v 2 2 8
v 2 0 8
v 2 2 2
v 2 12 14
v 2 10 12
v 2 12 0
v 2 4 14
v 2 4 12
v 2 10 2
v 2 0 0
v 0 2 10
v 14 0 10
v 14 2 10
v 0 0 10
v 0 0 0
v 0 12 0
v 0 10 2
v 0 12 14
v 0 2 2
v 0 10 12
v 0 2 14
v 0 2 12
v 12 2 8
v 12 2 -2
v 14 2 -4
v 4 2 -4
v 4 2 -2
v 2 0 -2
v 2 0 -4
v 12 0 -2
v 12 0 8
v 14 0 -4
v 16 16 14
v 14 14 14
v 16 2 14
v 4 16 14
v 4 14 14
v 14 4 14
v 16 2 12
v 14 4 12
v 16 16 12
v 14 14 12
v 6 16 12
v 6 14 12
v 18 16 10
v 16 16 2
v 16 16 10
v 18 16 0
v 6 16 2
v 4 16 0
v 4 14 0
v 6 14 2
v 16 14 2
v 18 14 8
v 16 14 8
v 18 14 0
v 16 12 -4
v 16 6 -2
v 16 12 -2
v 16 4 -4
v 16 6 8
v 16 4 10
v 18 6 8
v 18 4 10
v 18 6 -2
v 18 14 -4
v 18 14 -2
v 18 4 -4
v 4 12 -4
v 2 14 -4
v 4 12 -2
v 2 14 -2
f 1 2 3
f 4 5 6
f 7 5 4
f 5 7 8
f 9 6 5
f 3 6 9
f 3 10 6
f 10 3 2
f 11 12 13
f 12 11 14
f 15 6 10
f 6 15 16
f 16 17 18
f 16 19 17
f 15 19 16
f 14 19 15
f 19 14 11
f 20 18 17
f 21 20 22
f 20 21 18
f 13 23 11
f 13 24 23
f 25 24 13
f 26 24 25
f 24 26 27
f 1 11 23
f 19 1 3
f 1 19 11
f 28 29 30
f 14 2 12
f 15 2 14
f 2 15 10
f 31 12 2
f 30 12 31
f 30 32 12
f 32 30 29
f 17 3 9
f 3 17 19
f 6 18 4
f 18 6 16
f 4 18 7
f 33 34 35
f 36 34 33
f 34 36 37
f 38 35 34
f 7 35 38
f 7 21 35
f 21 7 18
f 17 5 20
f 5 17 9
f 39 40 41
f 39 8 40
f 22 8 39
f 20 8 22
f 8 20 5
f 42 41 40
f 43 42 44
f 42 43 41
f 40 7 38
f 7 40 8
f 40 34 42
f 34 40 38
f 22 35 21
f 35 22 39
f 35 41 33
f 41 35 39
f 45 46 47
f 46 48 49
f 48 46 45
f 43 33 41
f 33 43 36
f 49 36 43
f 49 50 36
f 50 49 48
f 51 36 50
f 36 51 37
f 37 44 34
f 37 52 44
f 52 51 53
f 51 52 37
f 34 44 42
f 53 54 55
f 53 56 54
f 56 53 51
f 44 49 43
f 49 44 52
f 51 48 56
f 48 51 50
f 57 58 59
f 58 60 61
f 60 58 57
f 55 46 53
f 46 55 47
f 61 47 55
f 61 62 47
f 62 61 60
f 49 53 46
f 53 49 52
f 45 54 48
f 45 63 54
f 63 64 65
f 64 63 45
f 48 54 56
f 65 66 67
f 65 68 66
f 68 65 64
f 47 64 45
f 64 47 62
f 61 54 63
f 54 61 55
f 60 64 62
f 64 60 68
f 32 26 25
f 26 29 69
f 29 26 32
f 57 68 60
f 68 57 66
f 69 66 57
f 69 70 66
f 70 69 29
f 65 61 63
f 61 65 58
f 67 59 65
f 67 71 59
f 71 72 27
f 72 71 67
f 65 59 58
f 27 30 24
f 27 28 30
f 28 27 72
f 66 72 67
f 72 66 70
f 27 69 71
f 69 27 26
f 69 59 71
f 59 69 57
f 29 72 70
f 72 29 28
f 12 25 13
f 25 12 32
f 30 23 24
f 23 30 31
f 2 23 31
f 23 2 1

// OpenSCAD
cube([2,2,10]);
translate([0,0,10]);
cube([2,12,2]);
translate([0,10,0]) cube([2,2,14]);
translate([0,4,12]) cube([2,8,2]);
translate([0,2,12]) cube([14,2,2]);
translate([14,2,12]) cube([2,14,2]);
translate([4,14,12]) cube([12,2,2]);
translate([4,14,0]) cube([2,2,14]);
translate([4,14,0]) cube([12,2,2]);
translate([16,14,0]) cube([2,2,10]);
translate([16,4,8]) cube([2,12,2]);
translate([16,4,-4]) cube([2,2,12]);
translate([16,4,-4]) cube([2,10,2]);
translate([4,12,-4]) cube([12,2,2]);
translate([2,0,-4]) cube([2,14,2]);
translate([2,0,-4]) cube([12,2,2]);
translate([12,0,-4]) cube([2,2,14]);
translate([0,0,8]) cube([12,2,2]);
